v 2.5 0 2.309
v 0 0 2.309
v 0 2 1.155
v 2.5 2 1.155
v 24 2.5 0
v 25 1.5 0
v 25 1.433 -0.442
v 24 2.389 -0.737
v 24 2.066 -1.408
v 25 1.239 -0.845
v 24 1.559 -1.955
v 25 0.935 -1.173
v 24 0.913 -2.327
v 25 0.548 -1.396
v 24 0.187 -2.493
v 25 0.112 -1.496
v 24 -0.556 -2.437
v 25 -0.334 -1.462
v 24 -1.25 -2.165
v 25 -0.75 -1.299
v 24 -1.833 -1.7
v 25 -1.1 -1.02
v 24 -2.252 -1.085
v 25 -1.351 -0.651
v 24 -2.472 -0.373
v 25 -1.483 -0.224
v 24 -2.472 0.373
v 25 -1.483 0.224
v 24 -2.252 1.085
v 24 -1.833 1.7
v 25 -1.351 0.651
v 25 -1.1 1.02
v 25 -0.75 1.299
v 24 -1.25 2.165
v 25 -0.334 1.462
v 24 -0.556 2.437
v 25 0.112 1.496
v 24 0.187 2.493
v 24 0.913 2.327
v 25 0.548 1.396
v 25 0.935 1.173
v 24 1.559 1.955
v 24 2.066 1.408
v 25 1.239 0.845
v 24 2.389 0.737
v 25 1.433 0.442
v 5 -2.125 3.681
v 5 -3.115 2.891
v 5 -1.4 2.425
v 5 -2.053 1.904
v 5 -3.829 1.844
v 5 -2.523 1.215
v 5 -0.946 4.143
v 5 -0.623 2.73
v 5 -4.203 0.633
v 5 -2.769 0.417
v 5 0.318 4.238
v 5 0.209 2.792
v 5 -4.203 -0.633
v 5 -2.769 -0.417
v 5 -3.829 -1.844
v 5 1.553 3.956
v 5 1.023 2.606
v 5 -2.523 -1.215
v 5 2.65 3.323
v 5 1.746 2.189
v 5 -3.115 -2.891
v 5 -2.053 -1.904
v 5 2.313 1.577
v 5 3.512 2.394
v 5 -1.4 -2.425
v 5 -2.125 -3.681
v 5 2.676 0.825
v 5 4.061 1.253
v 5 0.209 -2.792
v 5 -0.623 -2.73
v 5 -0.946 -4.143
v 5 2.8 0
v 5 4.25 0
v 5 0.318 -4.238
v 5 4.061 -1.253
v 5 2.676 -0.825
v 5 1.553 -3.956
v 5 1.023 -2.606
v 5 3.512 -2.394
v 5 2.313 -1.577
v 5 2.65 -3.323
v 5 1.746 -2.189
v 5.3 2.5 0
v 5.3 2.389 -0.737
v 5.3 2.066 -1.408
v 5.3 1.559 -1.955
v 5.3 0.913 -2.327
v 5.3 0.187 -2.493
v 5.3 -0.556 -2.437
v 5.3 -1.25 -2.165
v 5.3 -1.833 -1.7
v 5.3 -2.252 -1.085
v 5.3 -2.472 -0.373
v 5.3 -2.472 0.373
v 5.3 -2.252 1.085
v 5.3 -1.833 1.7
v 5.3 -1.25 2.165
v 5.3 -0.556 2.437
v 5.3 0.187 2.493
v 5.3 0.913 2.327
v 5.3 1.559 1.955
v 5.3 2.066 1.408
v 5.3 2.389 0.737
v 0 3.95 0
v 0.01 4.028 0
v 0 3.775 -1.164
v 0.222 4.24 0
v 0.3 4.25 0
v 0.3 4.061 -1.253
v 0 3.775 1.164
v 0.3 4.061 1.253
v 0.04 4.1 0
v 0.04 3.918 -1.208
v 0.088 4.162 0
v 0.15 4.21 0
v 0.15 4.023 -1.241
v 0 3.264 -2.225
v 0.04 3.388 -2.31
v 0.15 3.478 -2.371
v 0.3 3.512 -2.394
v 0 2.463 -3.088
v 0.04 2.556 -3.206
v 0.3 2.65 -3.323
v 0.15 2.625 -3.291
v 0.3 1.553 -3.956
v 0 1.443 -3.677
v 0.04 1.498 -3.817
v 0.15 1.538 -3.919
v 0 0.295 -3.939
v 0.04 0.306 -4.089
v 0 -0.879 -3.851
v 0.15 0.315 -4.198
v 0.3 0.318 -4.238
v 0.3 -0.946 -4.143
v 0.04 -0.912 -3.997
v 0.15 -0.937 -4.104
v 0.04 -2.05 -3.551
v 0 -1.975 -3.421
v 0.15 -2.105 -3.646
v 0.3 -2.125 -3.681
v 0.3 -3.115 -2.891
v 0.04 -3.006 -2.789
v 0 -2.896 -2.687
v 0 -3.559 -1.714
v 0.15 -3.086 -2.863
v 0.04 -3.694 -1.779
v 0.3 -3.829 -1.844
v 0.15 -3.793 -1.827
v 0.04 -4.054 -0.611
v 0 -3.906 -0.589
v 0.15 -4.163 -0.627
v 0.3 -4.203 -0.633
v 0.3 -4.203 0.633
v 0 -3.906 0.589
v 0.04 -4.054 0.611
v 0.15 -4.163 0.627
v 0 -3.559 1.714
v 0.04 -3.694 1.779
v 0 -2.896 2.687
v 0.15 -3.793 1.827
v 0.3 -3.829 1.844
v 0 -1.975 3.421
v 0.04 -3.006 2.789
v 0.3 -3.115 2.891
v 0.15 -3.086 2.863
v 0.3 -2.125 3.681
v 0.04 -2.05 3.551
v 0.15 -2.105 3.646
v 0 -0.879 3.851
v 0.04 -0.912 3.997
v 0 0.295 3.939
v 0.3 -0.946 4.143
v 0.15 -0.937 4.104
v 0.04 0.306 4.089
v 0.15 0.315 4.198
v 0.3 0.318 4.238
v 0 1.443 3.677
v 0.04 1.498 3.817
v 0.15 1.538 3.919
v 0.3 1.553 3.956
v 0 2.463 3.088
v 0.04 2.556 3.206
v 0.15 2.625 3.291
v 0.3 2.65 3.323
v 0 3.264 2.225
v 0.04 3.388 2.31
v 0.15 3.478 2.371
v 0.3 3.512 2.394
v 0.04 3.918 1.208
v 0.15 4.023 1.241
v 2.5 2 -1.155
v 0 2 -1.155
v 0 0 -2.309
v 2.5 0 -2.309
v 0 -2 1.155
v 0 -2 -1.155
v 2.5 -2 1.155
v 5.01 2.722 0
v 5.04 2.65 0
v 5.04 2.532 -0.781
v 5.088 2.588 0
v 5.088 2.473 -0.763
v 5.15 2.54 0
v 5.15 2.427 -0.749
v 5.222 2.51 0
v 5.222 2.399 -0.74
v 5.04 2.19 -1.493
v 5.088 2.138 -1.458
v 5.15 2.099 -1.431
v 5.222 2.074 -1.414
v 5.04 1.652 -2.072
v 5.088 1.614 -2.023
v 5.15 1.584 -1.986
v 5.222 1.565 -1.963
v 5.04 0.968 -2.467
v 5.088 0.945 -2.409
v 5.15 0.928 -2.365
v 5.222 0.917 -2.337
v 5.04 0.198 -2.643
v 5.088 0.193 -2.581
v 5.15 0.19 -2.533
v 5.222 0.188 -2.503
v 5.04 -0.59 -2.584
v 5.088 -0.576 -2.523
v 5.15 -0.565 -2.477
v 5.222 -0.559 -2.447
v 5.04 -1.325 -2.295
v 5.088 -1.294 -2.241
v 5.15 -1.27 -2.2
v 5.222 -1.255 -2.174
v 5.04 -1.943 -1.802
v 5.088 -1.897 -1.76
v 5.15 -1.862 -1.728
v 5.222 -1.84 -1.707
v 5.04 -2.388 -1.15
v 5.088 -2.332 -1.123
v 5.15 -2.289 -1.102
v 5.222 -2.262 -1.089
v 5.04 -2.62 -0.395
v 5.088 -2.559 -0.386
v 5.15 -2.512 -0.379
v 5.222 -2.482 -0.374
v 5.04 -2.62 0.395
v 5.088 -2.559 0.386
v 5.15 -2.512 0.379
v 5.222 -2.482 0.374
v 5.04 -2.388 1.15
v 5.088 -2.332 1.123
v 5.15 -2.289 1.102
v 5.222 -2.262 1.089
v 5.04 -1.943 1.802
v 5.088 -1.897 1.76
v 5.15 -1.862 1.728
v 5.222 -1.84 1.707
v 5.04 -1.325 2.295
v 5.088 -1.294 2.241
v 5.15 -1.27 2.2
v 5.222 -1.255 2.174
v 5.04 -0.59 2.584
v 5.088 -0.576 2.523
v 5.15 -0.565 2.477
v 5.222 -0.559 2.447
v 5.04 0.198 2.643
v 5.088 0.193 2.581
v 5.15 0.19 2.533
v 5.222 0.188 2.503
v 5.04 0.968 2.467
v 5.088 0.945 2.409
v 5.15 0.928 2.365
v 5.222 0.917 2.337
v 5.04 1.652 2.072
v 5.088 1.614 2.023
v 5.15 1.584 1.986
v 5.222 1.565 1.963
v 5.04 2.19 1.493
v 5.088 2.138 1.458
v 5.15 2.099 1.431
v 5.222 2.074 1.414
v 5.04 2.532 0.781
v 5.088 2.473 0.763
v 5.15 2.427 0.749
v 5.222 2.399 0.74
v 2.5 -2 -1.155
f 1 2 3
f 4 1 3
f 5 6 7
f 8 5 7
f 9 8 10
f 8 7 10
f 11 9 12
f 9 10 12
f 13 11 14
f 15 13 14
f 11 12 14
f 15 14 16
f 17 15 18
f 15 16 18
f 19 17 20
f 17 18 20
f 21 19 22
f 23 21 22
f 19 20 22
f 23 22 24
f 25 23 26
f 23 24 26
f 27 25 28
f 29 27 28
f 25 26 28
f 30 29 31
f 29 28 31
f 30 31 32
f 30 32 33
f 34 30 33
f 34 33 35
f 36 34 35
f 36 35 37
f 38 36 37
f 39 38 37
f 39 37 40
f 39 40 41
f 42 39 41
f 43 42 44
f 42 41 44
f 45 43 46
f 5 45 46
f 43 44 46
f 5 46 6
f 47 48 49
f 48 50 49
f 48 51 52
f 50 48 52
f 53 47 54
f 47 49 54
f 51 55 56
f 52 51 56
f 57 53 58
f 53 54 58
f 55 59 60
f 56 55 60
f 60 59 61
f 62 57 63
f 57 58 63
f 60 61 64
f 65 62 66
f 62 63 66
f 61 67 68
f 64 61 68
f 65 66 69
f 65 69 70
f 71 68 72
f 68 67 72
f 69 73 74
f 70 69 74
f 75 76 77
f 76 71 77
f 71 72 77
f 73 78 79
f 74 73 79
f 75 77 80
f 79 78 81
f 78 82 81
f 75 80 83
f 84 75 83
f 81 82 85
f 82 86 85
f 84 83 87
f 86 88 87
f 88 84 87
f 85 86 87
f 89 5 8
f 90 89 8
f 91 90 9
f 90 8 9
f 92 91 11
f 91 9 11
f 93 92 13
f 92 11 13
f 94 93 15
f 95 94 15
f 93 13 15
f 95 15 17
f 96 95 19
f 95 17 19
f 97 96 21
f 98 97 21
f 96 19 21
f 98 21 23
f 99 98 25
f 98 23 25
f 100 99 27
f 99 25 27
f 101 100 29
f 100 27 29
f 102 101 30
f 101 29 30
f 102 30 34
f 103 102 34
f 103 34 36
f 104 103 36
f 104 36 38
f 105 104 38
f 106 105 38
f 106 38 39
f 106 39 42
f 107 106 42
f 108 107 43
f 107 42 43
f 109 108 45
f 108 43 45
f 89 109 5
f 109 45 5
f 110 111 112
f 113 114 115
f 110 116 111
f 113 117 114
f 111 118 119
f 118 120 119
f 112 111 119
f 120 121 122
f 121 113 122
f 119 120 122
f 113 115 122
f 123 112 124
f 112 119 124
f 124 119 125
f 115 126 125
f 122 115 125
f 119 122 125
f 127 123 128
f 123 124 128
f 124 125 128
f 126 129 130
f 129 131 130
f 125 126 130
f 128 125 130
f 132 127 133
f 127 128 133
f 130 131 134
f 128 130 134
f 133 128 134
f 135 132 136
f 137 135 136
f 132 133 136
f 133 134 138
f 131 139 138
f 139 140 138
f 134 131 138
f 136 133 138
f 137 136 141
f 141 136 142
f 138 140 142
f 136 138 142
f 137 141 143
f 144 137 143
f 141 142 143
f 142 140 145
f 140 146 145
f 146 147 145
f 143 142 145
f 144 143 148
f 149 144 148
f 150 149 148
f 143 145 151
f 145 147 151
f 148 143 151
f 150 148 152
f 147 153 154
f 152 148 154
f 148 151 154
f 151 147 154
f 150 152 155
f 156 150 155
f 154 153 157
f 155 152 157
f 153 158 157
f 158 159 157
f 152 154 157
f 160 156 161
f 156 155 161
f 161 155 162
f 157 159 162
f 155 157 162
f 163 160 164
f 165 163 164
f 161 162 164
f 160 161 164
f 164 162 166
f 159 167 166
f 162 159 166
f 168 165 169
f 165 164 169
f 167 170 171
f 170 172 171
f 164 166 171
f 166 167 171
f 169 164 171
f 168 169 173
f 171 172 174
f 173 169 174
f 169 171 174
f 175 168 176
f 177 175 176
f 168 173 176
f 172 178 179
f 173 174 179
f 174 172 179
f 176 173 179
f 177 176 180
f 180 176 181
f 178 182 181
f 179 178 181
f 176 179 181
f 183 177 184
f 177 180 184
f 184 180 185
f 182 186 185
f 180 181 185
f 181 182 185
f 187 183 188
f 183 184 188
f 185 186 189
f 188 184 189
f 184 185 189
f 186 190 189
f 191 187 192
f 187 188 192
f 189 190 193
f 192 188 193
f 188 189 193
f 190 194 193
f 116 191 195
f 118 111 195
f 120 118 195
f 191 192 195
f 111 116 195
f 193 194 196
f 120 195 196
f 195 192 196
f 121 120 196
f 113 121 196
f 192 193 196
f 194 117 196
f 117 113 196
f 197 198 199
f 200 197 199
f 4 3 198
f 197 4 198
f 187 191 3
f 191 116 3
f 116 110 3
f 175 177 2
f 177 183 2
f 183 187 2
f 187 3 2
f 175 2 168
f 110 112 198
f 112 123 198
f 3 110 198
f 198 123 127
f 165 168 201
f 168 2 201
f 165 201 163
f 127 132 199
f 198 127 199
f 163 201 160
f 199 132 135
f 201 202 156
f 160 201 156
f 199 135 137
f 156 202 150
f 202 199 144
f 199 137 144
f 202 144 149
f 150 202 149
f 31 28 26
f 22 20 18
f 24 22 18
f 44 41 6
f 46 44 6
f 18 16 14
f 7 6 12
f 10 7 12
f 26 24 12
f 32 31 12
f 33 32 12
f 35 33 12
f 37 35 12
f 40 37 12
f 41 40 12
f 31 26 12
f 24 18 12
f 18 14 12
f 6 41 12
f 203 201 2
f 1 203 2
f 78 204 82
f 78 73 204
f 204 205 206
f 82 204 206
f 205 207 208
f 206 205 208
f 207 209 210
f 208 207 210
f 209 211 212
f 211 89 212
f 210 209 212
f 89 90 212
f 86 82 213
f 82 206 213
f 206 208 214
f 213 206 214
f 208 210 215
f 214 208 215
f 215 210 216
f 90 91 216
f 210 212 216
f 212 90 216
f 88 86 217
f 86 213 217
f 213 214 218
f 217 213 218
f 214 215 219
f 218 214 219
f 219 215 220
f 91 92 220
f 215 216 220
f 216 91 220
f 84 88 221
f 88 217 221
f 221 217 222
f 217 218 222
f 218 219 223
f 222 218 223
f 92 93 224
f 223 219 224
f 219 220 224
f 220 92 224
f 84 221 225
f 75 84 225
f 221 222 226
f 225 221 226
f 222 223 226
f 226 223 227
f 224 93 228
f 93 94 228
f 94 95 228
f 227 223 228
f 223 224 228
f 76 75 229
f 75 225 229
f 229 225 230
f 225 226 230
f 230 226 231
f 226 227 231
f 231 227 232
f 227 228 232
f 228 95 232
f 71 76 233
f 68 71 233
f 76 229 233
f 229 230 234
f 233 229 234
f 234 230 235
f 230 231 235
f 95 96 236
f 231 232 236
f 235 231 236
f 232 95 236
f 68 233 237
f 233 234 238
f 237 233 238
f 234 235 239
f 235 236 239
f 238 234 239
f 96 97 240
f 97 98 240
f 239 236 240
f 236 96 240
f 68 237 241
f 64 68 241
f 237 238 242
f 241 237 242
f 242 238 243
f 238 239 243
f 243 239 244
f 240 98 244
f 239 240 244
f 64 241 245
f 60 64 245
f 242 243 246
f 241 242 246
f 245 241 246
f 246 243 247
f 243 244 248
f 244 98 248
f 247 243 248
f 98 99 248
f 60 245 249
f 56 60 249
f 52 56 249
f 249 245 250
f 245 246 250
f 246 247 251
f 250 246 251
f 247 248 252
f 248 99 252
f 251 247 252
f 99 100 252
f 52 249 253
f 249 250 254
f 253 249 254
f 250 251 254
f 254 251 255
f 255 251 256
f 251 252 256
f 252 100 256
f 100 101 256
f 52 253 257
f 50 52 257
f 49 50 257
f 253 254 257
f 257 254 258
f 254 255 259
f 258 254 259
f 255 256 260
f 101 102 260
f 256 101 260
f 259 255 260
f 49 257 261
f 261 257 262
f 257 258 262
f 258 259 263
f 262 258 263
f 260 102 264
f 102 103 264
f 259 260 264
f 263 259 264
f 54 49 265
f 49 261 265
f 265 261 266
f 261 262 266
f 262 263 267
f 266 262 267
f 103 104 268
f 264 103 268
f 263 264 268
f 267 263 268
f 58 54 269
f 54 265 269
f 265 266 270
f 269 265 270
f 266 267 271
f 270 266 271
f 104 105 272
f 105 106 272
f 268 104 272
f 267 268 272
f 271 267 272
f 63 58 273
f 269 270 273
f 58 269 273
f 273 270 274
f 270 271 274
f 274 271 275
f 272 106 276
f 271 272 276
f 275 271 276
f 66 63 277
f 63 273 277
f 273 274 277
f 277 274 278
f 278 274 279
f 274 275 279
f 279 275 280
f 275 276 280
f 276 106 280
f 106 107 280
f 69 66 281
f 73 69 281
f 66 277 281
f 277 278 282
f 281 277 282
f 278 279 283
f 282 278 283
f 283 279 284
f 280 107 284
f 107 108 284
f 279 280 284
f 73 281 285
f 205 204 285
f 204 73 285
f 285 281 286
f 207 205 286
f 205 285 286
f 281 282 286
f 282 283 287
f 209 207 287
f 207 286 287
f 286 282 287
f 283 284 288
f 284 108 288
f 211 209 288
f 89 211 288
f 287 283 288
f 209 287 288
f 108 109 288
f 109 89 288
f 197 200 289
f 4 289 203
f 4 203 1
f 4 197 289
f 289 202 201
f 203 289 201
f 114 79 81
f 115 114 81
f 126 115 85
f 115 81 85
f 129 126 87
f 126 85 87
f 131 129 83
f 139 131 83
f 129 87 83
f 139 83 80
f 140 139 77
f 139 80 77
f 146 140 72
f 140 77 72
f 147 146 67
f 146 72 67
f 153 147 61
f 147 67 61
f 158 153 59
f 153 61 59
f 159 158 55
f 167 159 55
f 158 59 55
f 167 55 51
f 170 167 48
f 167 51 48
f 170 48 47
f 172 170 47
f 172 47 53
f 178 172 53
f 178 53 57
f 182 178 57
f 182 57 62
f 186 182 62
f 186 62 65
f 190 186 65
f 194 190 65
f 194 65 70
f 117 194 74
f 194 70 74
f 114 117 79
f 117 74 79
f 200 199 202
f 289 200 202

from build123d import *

# Parameters (mm, degrees)
CUT_EXTRUDE_1_DEPTH = 2.5
FILLET_1_R          = 0.3
CHAMFER_1_SIZE      = 1


with BuildPart() as part:
    # Эскиз1 → Повернуть1 (revolve)
    with BuildSketch(Plane.XY):
        Polygon((0, 0), (0, 4.25), (5, 4.25), (5, 2.5), (25, 2.5), (25, 0), align=None)
    revolve(axis=Axis((25, 0, 0), (-1, 0, 0)))

    # Эскиз2 → Вырез-Вытянуть1 (cut)
    with BuildSketch(Plane.ZY):
        Polygon((-1.154700538, 2), (-2.309401077, 0), (-1.154700538, -2), (1.154700538, -2), (2.309401077, 0), (1.154700538, 2), align=None)
    extrude(amount=-CUT_EXTRUDE_1_DEPTH, mode=Mode.SUBTRACT)

    # Скругление1
    fillet_1_edges = [part.edges().sort_by_distance(p)[0] for p in [
        (5, -2.5, 0),
        (0, -4.25, 0),
    ]]
    fillet(fillet_1_edges, radius=FILLET_1_R)

    # Фаска1
    chamfer_1_edges = [part.edges().sort_by_distance(p)[0] for p in [
        (25, -2.5, 0),
    ]]
    chamfer(chamfer_1_edges, length=CHAMFER_1_SIZE)


solid = part.part
